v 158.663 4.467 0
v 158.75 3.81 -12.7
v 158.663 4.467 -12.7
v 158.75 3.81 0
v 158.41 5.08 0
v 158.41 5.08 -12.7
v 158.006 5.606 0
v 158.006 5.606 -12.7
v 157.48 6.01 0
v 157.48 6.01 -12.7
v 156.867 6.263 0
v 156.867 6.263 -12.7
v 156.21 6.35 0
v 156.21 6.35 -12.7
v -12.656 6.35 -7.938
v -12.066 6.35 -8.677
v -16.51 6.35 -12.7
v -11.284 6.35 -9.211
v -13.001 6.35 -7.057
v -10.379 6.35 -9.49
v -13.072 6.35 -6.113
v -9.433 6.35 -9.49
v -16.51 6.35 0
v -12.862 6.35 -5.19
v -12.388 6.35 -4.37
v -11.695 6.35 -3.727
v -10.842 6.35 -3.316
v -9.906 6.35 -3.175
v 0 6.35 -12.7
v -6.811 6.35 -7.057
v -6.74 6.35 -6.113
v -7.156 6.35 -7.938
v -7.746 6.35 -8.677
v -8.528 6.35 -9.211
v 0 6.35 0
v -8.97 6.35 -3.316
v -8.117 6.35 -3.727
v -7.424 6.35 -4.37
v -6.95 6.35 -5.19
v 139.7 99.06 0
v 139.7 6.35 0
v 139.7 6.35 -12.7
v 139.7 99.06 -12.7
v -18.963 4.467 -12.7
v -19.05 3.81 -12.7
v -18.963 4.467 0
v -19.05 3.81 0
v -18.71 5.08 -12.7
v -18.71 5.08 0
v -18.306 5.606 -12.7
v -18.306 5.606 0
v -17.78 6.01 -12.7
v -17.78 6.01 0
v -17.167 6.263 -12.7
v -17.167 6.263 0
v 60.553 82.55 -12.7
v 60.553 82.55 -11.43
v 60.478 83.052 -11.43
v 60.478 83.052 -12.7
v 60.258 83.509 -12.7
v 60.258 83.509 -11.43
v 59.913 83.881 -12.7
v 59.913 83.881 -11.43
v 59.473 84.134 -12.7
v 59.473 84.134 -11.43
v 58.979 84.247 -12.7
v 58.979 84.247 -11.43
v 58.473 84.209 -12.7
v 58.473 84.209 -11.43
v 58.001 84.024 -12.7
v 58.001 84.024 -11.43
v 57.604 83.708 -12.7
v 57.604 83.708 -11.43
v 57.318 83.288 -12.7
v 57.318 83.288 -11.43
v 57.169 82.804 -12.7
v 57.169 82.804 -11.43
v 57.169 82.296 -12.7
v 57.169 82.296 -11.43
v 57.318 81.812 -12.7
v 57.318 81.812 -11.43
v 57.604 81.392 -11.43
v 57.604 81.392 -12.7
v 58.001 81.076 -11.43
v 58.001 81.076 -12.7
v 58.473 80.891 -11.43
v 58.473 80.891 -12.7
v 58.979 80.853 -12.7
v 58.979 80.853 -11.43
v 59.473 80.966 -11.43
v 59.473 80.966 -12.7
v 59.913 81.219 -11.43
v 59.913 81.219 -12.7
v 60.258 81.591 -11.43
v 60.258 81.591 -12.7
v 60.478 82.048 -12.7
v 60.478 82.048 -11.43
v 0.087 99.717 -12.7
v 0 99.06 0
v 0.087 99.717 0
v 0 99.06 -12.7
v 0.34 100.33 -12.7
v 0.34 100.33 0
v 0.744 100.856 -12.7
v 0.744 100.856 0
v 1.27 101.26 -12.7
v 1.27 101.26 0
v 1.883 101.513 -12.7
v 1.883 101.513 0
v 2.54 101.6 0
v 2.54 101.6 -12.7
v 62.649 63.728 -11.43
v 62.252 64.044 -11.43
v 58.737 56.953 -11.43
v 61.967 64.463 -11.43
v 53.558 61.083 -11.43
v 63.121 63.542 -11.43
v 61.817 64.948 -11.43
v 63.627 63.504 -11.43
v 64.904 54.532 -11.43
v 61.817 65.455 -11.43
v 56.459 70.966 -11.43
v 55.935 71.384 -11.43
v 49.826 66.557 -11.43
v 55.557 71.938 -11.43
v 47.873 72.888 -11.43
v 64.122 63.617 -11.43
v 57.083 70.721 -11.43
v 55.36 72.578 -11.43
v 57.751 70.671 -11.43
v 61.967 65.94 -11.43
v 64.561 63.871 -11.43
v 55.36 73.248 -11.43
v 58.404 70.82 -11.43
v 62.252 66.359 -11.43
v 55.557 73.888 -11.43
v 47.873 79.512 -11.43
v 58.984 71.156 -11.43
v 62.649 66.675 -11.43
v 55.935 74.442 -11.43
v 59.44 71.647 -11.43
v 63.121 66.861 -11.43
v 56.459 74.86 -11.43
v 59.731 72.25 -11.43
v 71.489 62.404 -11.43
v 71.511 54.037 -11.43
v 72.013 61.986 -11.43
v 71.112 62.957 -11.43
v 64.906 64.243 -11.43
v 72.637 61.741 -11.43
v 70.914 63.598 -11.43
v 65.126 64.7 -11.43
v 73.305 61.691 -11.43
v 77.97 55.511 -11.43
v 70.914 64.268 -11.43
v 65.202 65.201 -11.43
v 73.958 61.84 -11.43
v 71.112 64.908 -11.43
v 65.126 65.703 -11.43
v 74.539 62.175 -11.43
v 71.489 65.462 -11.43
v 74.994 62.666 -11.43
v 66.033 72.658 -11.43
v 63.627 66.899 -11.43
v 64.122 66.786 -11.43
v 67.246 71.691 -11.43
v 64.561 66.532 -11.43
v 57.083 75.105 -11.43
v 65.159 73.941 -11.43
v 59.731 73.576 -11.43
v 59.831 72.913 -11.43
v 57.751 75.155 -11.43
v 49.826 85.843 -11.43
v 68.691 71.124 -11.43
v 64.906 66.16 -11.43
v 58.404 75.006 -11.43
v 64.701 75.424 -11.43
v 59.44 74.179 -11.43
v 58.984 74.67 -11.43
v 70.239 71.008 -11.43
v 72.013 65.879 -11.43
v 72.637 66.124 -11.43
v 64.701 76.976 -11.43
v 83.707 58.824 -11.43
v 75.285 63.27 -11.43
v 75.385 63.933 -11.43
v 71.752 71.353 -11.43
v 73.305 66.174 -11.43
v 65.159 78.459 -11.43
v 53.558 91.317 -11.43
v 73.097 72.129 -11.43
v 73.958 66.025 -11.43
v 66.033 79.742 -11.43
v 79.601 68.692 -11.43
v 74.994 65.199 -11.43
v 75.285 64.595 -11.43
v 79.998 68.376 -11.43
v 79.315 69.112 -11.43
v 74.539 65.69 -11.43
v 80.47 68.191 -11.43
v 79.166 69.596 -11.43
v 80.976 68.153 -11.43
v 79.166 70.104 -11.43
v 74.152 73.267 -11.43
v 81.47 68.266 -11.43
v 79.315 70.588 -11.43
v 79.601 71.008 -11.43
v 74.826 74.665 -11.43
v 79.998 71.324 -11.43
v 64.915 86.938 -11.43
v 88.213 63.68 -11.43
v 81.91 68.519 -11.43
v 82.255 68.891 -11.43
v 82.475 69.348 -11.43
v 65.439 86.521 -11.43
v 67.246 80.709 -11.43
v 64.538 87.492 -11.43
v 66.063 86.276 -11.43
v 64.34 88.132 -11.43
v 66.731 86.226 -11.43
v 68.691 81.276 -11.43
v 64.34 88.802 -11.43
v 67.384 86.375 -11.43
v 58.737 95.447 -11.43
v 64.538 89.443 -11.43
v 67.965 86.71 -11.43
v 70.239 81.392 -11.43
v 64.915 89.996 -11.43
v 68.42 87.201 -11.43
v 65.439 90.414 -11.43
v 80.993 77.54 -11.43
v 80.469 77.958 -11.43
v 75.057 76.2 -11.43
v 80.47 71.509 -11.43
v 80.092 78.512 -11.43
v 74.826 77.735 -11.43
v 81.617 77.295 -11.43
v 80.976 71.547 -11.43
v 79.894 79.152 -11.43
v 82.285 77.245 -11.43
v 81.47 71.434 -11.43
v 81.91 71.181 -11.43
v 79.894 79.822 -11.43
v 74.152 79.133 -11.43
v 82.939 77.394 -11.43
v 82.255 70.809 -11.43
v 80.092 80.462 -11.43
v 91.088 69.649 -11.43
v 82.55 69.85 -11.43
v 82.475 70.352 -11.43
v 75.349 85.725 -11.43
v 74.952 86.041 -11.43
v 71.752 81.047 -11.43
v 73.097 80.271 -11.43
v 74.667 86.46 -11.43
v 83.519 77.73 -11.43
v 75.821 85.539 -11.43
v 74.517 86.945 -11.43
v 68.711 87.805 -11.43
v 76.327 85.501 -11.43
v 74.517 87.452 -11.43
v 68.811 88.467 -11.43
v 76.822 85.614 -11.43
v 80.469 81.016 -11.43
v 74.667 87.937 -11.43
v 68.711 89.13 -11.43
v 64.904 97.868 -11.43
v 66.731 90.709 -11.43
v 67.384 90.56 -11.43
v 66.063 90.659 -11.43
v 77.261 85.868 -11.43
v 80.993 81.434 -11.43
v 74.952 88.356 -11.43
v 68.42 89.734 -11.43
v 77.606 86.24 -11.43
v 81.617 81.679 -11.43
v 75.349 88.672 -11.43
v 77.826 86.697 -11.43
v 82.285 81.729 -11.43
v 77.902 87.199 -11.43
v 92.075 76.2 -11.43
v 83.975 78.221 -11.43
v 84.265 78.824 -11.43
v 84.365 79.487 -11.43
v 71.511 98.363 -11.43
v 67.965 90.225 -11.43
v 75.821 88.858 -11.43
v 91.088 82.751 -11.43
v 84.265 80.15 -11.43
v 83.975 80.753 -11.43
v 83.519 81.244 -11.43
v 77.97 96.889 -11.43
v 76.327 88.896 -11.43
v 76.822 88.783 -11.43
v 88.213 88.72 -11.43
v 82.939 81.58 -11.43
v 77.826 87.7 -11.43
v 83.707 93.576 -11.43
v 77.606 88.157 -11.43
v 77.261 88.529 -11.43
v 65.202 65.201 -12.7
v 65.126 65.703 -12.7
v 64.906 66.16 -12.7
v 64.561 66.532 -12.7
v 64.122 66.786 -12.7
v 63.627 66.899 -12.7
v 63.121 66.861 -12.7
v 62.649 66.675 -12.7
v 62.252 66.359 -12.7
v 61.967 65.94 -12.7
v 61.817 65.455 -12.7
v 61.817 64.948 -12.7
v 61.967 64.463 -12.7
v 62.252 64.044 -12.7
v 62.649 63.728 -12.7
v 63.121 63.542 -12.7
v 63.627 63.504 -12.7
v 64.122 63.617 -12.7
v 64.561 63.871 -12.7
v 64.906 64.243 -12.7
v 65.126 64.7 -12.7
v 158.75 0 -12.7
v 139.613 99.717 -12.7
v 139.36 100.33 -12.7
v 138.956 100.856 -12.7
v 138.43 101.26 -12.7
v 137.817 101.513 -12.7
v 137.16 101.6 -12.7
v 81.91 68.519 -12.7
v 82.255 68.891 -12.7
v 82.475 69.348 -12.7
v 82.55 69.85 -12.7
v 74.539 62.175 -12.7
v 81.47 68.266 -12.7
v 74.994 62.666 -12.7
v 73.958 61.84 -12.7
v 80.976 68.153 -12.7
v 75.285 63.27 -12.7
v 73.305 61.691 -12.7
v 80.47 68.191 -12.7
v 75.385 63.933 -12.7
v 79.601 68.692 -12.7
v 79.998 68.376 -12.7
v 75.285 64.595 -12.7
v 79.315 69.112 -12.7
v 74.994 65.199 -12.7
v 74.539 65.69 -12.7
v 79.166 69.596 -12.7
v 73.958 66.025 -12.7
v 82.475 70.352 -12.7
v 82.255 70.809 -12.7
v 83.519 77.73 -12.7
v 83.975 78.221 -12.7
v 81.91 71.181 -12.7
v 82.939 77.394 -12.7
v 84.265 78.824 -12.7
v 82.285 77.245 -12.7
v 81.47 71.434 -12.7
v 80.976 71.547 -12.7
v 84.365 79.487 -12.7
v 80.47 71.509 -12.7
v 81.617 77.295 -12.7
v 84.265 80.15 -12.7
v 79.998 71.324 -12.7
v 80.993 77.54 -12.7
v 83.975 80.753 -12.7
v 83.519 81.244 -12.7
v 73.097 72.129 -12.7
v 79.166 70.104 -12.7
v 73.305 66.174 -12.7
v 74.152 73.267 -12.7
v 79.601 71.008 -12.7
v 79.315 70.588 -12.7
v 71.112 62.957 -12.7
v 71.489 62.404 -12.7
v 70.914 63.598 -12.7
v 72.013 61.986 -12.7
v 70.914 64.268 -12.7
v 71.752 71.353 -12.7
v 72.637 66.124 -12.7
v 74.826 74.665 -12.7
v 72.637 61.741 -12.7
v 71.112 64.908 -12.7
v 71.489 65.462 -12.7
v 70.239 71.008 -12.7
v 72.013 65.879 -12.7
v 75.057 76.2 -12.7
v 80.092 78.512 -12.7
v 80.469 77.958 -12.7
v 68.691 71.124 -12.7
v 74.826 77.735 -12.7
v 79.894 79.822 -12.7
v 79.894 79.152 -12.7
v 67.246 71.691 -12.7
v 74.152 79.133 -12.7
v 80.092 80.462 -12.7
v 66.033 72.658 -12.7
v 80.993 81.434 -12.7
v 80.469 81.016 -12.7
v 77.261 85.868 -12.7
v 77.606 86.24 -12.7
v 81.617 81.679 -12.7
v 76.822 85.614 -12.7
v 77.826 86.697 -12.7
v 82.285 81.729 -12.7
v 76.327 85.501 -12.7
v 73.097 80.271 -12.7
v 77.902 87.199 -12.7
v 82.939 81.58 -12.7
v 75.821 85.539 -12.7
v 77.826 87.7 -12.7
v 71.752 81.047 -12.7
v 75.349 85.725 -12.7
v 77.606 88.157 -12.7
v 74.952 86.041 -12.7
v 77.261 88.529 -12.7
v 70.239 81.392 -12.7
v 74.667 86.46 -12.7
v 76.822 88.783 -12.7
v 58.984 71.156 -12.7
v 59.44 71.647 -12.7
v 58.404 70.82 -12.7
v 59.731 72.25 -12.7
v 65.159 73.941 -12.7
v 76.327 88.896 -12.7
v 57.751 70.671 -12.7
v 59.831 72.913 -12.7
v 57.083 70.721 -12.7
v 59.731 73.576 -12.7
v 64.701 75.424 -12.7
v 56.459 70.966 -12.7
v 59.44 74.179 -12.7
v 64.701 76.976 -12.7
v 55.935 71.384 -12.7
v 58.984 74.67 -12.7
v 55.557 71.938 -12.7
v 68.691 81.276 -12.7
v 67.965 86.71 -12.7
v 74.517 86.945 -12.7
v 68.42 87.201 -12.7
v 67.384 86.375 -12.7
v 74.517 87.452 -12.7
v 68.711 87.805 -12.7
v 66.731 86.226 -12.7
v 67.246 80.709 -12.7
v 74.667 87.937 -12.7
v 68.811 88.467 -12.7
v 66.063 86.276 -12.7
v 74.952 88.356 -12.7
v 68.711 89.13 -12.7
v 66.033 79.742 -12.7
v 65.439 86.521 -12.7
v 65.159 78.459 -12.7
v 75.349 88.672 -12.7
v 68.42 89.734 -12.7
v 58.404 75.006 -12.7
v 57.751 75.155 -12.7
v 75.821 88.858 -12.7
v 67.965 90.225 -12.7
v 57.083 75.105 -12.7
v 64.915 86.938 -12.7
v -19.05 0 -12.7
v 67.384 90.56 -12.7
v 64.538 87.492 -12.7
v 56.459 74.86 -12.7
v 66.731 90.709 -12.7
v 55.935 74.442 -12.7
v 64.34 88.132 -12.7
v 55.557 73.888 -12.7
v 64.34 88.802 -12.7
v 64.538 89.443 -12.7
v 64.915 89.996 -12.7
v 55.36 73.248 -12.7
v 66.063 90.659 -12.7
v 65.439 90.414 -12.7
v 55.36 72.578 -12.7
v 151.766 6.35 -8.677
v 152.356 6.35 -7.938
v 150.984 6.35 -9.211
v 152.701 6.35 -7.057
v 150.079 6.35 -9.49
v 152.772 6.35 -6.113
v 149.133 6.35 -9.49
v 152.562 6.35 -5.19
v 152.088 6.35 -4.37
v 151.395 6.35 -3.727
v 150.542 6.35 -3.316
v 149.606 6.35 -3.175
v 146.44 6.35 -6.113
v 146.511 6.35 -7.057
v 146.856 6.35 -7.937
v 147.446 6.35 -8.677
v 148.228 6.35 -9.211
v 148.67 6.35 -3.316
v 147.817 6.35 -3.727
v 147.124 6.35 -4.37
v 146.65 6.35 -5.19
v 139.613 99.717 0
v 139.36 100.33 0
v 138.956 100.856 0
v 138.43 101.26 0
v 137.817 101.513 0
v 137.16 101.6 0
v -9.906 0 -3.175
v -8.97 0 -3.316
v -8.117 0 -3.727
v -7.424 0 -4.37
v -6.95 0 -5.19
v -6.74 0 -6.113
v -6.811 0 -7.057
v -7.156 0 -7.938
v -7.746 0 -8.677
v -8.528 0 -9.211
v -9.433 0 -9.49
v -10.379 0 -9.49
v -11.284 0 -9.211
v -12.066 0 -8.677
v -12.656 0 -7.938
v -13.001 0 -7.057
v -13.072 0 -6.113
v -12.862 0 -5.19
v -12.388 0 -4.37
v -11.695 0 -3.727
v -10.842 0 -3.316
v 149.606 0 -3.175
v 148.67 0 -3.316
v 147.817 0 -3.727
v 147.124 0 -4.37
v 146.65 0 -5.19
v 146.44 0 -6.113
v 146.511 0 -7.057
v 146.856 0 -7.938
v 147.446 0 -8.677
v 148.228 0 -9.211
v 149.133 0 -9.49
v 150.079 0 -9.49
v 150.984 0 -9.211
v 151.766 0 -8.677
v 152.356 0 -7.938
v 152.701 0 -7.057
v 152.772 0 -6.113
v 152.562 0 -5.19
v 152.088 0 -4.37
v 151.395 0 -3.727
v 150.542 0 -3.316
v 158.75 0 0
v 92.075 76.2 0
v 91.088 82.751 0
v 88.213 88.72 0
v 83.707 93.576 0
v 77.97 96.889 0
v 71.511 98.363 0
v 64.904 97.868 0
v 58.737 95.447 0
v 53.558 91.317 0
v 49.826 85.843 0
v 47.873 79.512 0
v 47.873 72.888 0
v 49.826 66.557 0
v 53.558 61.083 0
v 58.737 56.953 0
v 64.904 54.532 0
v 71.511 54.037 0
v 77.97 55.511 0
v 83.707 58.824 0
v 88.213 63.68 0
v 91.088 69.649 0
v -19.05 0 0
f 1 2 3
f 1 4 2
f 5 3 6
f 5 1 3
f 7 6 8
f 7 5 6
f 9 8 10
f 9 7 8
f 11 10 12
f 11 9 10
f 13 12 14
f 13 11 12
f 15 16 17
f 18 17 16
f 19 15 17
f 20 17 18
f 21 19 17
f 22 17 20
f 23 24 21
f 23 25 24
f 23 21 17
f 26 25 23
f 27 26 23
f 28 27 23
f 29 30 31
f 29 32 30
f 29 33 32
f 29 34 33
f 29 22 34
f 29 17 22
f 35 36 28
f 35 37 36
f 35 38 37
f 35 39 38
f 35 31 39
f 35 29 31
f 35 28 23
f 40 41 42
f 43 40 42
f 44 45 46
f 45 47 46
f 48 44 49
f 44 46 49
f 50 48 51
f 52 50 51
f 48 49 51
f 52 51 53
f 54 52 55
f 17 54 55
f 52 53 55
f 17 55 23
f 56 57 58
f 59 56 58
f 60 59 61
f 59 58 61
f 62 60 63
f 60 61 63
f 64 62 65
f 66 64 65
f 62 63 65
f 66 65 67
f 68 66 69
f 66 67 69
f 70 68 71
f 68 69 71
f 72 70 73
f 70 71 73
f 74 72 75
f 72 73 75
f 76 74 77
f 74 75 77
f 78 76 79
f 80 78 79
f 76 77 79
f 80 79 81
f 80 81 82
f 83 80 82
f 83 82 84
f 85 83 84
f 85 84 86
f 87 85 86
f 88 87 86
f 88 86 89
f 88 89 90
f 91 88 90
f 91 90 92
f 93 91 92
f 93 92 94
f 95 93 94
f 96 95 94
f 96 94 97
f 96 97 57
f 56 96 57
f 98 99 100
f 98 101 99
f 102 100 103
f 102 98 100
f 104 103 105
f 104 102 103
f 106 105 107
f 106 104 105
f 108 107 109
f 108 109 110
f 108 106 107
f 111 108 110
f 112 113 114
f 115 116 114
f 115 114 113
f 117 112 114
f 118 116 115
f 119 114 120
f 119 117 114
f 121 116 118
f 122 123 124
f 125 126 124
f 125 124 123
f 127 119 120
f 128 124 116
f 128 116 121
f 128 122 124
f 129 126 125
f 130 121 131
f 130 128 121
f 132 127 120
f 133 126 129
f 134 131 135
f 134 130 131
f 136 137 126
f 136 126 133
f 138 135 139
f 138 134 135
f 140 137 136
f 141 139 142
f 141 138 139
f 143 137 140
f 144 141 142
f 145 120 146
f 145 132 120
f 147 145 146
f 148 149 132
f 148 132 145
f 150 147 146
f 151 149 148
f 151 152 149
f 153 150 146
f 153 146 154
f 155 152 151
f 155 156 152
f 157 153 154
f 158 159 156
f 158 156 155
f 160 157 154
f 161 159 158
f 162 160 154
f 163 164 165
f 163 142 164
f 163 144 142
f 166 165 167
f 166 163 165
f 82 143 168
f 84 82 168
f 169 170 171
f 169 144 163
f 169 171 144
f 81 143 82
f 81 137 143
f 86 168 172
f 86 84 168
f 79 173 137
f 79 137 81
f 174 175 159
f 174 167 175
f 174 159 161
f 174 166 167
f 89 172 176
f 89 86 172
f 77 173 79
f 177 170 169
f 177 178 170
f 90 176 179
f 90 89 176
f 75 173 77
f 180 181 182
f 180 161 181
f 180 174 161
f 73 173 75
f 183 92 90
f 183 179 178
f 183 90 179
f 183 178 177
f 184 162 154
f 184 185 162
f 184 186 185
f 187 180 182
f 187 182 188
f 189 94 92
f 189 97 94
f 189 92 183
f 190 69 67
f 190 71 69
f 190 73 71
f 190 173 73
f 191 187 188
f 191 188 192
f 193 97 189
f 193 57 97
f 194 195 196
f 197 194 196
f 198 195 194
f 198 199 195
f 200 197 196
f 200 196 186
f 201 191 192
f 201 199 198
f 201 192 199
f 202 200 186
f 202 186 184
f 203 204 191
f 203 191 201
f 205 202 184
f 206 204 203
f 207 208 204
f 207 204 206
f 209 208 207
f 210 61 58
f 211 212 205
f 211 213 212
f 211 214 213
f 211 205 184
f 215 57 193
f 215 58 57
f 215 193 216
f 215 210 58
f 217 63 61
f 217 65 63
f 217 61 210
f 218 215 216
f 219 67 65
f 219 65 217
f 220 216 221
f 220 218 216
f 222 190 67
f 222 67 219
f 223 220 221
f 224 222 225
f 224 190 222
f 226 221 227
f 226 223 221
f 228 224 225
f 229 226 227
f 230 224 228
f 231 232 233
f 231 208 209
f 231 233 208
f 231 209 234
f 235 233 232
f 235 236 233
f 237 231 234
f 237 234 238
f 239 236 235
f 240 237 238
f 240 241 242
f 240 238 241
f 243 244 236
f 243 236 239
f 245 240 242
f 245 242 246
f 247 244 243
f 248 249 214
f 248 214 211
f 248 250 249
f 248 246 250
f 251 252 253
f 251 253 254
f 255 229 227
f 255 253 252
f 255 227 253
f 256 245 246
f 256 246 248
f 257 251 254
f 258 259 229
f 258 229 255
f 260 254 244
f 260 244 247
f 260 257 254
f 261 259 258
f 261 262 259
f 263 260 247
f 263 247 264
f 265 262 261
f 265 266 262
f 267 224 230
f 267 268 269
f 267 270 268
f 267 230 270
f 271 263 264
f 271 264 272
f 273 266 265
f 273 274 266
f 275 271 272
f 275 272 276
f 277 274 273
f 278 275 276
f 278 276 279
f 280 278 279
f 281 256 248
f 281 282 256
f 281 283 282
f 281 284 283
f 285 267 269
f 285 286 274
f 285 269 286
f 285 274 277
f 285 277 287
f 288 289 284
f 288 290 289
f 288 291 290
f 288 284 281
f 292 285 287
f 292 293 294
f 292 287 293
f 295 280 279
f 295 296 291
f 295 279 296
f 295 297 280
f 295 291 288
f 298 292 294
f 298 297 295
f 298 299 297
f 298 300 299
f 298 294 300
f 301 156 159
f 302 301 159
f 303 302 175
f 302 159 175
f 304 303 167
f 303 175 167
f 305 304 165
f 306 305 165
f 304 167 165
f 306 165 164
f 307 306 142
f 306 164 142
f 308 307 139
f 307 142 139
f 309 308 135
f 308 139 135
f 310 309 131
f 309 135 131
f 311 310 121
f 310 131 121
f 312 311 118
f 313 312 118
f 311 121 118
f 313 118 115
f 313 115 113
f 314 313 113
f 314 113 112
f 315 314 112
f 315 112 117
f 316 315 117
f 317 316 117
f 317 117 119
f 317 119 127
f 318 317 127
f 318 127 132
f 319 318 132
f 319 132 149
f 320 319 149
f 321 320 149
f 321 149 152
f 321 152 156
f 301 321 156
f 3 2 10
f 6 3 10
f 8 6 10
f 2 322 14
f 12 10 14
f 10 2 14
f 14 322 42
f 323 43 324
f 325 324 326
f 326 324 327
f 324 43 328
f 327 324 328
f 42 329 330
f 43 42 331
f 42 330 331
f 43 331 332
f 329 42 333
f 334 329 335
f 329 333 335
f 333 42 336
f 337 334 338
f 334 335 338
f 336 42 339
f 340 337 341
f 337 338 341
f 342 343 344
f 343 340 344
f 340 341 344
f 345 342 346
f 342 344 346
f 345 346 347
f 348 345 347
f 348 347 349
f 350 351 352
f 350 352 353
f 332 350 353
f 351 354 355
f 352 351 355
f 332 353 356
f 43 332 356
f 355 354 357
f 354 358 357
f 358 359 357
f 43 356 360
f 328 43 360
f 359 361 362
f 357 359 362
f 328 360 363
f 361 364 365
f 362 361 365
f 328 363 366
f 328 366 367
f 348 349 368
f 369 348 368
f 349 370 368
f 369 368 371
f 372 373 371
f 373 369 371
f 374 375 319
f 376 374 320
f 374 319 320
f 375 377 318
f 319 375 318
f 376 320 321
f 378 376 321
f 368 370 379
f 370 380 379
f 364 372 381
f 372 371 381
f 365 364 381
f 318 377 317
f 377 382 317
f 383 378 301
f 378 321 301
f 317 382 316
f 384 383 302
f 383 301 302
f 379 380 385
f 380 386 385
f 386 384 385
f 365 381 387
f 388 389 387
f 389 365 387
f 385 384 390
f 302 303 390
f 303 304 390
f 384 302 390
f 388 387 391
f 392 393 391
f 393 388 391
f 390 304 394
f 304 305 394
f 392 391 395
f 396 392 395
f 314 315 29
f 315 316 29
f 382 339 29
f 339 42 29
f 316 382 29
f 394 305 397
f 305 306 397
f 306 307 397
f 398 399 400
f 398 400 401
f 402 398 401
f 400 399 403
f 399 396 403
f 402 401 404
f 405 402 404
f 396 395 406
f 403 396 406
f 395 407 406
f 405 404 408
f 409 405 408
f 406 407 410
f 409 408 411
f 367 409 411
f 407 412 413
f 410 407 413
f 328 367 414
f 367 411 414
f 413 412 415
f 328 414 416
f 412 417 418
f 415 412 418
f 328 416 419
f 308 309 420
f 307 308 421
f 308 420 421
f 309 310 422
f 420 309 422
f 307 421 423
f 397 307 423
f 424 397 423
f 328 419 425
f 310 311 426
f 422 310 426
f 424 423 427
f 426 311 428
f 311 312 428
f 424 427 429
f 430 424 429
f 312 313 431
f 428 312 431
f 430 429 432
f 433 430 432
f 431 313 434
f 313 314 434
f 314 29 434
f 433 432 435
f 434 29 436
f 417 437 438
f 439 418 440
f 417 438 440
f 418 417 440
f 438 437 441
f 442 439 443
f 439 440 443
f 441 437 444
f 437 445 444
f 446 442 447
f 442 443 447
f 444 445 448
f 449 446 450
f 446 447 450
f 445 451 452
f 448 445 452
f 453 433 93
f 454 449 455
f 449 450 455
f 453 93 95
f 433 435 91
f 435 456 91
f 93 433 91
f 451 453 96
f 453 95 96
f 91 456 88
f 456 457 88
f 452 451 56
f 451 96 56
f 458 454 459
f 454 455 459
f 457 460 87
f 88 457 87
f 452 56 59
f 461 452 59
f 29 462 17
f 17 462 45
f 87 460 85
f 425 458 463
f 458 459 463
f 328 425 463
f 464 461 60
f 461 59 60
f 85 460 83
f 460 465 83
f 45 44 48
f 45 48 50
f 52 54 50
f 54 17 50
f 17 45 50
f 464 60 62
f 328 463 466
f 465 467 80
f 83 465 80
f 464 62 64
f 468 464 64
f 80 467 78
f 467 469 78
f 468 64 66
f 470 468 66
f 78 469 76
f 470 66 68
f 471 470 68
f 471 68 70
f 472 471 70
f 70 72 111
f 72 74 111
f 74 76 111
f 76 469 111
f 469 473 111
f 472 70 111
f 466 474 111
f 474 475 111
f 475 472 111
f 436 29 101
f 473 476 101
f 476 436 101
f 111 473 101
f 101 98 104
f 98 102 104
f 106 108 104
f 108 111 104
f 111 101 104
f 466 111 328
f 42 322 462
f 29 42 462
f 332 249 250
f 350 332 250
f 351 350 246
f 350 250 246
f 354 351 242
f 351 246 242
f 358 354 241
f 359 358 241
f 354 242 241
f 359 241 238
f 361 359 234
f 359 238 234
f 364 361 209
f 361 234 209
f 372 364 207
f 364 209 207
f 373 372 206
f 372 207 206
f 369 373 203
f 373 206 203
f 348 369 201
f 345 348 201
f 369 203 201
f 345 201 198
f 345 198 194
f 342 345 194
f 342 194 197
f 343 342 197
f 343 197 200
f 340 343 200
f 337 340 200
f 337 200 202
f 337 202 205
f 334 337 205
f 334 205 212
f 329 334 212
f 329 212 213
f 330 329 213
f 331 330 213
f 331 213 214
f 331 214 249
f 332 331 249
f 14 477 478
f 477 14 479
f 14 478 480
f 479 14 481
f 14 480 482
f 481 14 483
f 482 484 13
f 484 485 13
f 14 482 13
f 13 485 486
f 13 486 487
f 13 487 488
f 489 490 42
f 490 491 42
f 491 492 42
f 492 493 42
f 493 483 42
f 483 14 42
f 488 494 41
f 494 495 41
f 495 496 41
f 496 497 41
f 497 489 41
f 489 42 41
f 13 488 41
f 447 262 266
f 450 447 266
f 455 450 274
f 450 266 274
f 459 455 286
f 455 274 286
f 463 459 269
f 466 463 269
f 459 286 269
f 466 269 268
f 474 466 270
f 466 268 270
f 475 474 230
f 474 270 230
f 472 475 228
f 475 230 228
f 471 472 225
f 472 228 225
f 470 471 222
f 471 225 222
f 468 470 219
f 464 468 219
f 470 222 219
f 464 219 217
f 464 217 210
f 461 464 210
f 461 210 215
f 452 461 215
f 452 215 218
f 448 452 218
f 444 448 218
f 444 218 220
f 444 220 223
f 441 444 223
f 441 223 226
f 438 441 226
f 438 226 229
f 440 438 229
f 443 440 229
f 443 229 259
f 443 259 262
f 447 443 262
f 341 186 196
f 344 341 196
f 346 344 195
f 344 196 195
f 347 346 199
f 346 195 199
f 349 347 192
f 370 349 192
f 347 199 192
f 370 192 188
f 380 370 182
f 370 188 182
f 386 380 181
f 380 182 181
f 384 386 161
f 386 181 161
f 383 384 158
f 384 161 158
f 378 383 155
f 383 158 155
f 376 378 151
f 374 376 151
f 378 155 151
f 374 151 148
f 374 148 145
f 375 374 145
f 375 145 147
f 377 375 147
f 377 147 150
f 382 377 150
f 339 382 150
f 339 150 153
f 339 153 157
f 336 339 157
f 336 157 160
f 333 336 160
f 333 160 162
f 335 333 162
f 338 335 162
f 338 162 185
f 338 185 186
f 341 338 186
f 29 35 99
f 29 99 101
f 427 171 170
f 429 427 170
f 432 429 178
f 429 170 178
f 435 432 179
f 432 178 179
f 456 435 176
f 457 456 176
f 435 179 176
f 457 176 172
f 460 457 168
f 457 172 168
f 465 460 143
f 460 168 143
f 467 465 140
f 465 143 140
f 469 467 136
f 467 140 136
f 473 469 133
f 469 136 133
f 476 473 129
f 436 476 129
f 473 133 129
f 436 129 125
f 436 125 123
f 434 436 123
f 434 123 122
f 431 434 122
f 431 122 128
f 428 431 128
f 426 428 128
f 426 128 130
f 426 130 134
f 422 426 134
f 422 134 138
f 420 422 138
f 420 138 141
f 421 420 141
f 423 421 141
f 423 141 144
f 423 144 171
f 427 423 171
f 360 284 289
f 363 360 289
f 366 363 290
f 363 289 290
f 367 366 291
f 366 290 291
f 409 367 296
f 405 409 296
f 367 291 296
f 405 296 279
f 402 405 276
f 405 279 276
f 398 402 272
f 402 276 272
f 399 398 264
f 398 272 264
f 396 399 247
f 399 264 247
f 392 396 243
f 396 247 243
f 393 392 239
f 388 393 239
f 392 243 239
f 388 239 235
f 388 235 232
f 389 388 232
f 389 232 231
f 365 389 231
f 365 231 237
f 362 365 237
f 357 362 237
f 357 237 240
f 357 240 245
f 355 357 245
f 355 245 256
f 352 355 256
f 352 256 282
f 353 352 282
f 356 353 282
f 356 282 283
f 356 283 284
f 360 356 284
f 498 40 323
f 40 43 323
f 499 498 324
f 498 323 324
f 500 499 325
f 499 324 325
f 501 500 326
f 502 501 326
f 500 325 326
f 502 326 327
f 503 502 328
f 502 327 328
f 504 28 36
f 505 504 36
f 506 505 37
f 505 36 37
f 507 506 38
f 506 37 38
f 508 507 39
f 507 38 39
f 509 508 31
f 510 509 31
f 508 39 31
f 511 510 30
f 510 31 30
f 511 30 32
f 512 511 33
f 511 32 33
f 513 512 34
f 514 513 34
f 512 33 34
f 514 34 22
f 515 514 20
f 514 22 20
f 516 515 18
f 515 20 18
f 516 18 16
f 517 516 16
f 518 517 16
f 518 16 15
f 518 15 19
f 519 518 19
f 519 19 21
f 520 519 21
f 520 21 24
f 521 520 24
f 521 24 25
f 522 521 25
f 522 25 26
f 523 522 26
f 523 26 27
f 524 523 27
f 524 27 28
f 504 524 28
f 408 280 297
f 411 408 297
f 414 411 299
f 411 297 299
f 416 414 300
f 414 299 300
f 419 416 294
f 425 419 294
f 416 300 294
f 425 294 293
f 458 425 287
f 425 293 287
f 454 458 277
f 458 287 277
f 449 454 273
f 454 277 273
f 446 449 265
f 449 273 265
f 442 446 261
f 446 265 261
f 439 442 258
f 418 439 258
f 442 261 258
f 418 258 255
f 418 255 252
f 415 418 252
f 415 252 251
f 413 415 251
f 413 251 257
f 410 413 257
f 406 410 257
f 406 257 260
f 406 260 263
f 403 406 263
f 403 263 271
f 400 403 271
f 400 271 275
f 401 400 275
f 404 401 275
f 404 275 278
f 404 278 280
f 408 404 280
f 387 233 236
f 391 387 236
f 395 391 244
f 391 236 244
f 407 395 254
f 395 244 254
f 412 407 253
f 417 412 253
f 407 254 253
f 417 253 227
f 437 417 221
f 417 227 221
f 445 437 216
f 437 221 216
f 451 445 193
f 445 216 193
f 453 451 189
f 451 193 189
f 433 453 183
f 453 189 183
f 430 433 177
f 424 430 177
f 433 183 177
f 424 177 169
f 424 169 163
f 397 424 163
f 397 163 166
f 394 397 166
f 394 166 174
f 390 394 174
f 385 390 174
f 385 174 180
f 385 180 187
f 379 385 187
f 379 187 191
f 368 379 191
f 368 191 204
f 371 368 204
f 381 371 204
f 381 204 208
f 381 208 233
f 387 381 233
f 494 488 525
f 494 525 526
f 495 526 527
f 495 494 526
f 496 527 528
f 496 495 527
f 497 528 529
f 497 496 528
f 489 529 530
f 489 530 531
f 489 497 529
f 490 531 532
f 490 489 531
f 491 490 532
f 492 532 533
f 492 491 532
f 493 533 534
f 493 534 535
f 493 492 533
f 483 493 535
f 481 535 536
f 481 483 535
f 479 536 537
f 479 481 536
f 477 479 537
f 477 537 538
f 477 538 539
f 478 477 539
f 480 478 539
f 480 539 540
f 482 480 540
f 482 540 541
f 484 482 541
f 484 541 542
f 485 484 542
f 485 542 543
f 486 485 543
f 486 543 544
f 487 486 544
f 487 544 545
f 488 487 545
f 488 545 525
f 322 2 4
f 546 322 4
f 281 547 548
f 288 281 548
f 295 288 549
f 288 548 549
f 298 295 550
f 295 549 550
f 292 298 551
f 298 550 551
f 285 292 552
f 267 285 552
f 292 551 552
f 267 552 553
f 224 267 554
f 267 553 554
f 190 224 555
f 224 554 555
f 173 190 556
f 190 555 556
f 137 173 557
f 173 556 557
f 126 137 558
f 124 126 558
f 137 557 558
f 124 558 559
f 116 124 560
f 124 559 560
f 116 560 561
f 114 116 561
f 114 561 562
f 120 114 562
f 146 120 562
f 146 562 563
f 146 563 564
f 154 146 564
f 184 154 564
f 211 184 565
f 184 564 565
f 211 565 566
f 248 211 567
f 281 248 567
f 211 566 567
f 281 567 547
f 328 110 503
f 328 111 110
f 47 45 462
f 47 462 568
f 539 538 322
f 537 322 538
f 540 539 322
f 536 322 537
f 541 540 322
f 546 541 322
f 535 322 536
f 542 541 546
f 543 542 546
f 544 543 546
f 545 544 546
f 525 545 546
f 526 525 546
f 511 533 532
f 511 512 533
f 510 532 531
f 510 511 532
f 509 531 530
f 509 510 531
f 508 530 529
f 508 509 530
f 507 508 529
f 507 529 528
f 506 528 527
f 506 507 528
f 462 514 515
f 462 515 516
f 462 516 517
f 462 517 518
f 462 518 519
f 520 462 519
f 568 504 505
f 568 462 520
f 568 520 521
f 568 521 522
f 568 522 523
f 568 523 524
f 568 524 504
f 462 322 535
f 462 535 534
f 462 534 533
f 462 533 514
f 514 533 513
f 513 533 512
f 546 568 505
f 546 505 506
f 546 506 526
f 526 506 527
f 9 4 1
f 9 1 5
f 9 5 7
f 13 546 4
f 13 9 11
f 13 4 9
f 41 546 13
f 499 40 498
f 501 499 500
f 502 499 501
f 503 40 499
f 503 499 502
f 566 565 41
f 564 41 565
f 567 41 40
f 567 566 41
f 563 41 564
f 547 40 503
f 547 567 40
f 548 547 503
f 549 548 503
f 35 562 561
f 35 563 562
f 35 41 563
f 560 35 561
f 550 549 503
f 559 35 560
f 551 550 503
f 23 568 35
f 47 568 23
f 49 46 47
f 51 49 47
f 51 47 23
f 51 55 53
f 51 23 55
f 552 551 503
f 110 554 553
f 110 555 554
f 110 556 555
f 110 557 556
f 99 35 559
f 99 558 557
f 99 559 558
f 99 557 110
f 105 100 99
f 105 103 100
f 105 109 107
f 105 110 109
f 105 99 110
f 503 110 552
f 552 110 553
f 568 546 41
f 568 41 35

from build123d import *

# Parameters (mm, degrees)
SKETCH1_W           = 139.7
SKETCH1_H           = 12.7
BOSS_EXTRUDE1_DEPTH = 101.6
SKETCH2_W           = 12.7
SKETCH2_H           = 6.35
BOSS_EXTRUDE2_DEPTH = 19.05
CUT_EXTRUDE1_REACH  = 190.906
SKETCH3_R           = 5.207
SKETCH4_R           = 22.225
CUT_EXTRUDE2_DEPTH  = 11.43
CUT_EXTRUDE3_REACH  = 190.825
SKETCH5_R           = 1.7018
SKETCH5_R_2         = 2.2479
CUT_EXTRUDE4_REACH  = 187.568
SKETCH6_R           = 3.175
FILLET1_R           = 2.54


with BuildPart() as part:
    # Sketch1 → Boss-Extrude1 (new body)
    with BuildSketch(Plane(origin=(0, 0, 0), x_dir=(1, 0, 0), z_dir=(0, 1, 0))):
        with Locations((69.85, 6.35)):
            Rectangle(SKETCH1_W, SKETCH1_H)
    extrude(amount=BOSS_EXTRUDE1_DEPTH)

    # Sketch2 → Boss-Extrude2 (add)
    with BuildSketch(Plane.ZY):
        with Locations((-6.35, 3.175)):
            Rectangle(SKETCH2_W, SKETCH2_H)
    boss_extrude2 = extrude(amount=BOSS_EXTRUDE2_DEPTH)

    # Mirror1: Boss-Extrude2 across plane
    add(boss_extrude2.mirror(Plane.ZY.offset(-69.85)))

    # Sketch3 → Cut-Extrude1 (cut, up to next)
    with BuildSketch(Plane.XY, mode=Mode.PRIVATE) as cut_extrude1_sk1:
        with Locations((69.85, 76.2)):
            Circle(SKETCH3_R)
    cut_extrude1_tool1 = extrude(cut_extrude1_sk1.sketch, amount=-CUT_EXTRUDE1_REACH, mode=Mode.PRIVATE) & part.part
    add(cut_extrude1_tool1.solids().sort_by_distance((69.85, 76.2, 0))[0], mode=Mode.SUBTRACT)

    # Sketch4 → Cut-Extrude2 (cut)
    with BuildSketch(Plane.XY):
        with Locations((69.85, 76.2)):
            Circle(SKETCH4_R)
    extrude(amount=-CUT_EXTRUDE2_DEPTH, mode=Mode.SUBTRACT)

    # Sketch5 → Cut-Extrude3 (cut, up to next)
    with BuildSketch(Plane.XY.offset(-11.43), mode=Mode.PRIVATE) as cut_extrude3_sk1:
        with Locations((58.851477372, 82.55)):
            Circle(SKETCH5_R)
    cut_extrude3_tool1 = extrude(cut_extrude3_sk1.sketch, amount=-CUT_EXTRUDE3_REACH, mode=Mode.PRIVATE) & part.part
    # Sketch5 → Cut-Extrude3 (cut, up to next)
    with BuildSketch(Plane.XY.offset(-11.43), mode=Mode.PRIVATE) as cut_extrude3_sk2:
        with Locations((66.562998127, 88.467257994)):
            Circle(SKETCH5_R_2)
    cut_extrude3_tool2 = extrude(cut_extrude3_sk2.sketch, amount=-CUT_EXTRUDE3_REACH, mode=Mode.PRIVATE) & part.part
    # Sketch5 → Cut-Extrude3 (cut, up to next)
    with BuildSketch(Plane.XY.offset(-11.43), mode=Mode.PRIVATE) as cut_extrude3_sk3:
        with Locations((82.117257994, 79.487001873)):
            Circle(SKETCH5_R_2)
    cut_extrude3_tool3 = extrude(cut_extrude3_sk3.sketch, amount=-CUT_EXTRUDE3_REACH, mode=Mode.PRIVATE) & part.part
    # Sketch5 → Cut-Extrude3 (cut, up to next)
    with BuildSketch(Plane.XY.offset(-11.43), mode=Mode.PRIVATE) as cut_extrude3_sk4:
        with Locations((73.137001873, 63.932742006)):
            Circle(SKETCH5_R_2)
    cut_extrude3_tool4 = extrude(cut_extrude3_sk4.sketch, amount=-CUT_EXTRUDE3_REACH, mode=Mode.PRIVATE) & part.part
    # Sketch5 → Cut-Extrude3 (cut, up to next)
    with BuildSketch(Plane.XY.offset(-11.43), mode=Mode.PRIVATE) as cut_extrude3_sk5:
        with Locations((57.582742006, 72.912998127)):
            Circle(SKETCH5_R_2)
    cut_extrude3_tool5 = extrude(cut_extrude3_sk5.sketch, amount=-CUT_EXTRUDE3_REACH, mode=Mode.PRIVATE) & part.part
    # Sketch5 → Cut-Extrude3 (cut, up to next)
    with BuildSketch(Plane.XY.offset(-11.43), mode=Mode.PRIVATE) as cut_extrude3_sk6:
        with Locations((76.2, 87.198522628)):
            Circle(SKETCH5_R)
    cut_extrude3_tool6 = extrude(cut_extrude3_sk6.sketch, amount=-CUT_EXTRUDE3_REACH, mode=Mode.PRIVATE) & part.part
    # Sketch5 → Cut-Extrude3 (cut, up to next)
    with BuildSketch(Plane.XY.offset(-11.43), mode=Mode.PRIVATE) as cut_extrude3_sk7:
        with Locations((80.848522628, 69.85)):
            Circle(SKETCH5_R)
    cut_extrude3_tool7 = extrude(cut_extrude3_sk7.sketch, amount=-CUT_EXTRUDE3_REACH, mode=Mode.PRIVATE) & part.part
    # Sketch5 → Cut-Extrude3 (cut, up to next)
    with BuildSketch(Plane.XY.offset(-11.43), mode=Mode.PRIVATE) as cut_extrude3_sk8:
        with Locations((63.5, 65.201477372)):
            Circle(SKETCH5_R)
    cut_extrude3_tool8 = extrude(cut_extrude3_sk8.sketch, amount=-CUT_EXTRUDE3_REACH, mode=Mode.PRIVATE) & part.part
    add(cut_extrude3_tool1.solids().sort_by_distance((58.851477, 82.55, -11.43))[0], mode=Mode.SUBTRACT)
    add(cut_extrude3_tool2.solids().sort_by_distance((66.562998, 88.467258, -11.43))[0], mode=Mode.SUBTRACT)
    add(cut_extrude3_tool3.solids().sort_by_distance((82.117258, 79.487002, -11.43))[0], mode=Mode.SUBTRACT)
    add(cut_extrude3_tool4.solids().sort_by_distance((73.137002, 63.932742, -11.43))[0], mode=Mode.SUBTRACT)
    add(cut_extrude3_tool5.solids().sort_by_distance((57.582742, 72.912998, -11.43))[0], mode=Mode.SUBTRACT)
    add(cut_extrude3_tool6.solids().sort_by_distance((76.2, 87.198523, -11.43))[0], mode=Mode.SUBTRACT)
    add(cut_extrude3_tool7.solids().sort_by_distance((80.848523, 69.85, -11.43))[0], mode=Mode.SUBTRACT)
    add(cut_extrude3_tool8.solids().sort_by_distance((63.5, 65.201477, -11.43))[0], mode=Mode.SUBTRACT)

    # Sketch6 → Cut-Extrude4 (cut, up to next)
    with BuildSketch(Plane(origin=(0, 6.35, 0), x_dir=(1, 0, 0), z_dir=(0, 1, 0)), mode=Mode.PRIVATE) as cut_extrude4_sk1:
        with Locations(Location((-9.906, 6.35, 0), (0, 0, 270))):
            Circle(SKETCH6_R)
    cut_extrude4_tool1 = extrude(cut_extrude4_sk1.sketch, amount=-CUT_EXTRUDE4_REACH, mode=Mode.PRIVATE) & part.part
    cut_extrude4 = cut_extrude4_tool1.solids().sort_by_distance((-9.906, 6.35, -6.35))[0]
    add(cut_extrude4, mode=Mode.SUBTRACT)

    # Mirror2: Cut-Extrude4 across plane
    add(cut_extrude4.mirror(Plane.ZY.offset(-69.85)), mode=Mode.SUBTRACT)

    # Fillet1
    fillet1_edges = [part.edges().sort_by_distance(p)[0] for p in [
        (139.7, 101.6, -6.35),
        (-19.05, 6.35, -6.35),
        (158.75, 6.35, -6.35),
        (0, 101.6, -6.35),
    ]]
    fillet(fillet1_edges, radius=FILLET1_R)


solid = part.part
